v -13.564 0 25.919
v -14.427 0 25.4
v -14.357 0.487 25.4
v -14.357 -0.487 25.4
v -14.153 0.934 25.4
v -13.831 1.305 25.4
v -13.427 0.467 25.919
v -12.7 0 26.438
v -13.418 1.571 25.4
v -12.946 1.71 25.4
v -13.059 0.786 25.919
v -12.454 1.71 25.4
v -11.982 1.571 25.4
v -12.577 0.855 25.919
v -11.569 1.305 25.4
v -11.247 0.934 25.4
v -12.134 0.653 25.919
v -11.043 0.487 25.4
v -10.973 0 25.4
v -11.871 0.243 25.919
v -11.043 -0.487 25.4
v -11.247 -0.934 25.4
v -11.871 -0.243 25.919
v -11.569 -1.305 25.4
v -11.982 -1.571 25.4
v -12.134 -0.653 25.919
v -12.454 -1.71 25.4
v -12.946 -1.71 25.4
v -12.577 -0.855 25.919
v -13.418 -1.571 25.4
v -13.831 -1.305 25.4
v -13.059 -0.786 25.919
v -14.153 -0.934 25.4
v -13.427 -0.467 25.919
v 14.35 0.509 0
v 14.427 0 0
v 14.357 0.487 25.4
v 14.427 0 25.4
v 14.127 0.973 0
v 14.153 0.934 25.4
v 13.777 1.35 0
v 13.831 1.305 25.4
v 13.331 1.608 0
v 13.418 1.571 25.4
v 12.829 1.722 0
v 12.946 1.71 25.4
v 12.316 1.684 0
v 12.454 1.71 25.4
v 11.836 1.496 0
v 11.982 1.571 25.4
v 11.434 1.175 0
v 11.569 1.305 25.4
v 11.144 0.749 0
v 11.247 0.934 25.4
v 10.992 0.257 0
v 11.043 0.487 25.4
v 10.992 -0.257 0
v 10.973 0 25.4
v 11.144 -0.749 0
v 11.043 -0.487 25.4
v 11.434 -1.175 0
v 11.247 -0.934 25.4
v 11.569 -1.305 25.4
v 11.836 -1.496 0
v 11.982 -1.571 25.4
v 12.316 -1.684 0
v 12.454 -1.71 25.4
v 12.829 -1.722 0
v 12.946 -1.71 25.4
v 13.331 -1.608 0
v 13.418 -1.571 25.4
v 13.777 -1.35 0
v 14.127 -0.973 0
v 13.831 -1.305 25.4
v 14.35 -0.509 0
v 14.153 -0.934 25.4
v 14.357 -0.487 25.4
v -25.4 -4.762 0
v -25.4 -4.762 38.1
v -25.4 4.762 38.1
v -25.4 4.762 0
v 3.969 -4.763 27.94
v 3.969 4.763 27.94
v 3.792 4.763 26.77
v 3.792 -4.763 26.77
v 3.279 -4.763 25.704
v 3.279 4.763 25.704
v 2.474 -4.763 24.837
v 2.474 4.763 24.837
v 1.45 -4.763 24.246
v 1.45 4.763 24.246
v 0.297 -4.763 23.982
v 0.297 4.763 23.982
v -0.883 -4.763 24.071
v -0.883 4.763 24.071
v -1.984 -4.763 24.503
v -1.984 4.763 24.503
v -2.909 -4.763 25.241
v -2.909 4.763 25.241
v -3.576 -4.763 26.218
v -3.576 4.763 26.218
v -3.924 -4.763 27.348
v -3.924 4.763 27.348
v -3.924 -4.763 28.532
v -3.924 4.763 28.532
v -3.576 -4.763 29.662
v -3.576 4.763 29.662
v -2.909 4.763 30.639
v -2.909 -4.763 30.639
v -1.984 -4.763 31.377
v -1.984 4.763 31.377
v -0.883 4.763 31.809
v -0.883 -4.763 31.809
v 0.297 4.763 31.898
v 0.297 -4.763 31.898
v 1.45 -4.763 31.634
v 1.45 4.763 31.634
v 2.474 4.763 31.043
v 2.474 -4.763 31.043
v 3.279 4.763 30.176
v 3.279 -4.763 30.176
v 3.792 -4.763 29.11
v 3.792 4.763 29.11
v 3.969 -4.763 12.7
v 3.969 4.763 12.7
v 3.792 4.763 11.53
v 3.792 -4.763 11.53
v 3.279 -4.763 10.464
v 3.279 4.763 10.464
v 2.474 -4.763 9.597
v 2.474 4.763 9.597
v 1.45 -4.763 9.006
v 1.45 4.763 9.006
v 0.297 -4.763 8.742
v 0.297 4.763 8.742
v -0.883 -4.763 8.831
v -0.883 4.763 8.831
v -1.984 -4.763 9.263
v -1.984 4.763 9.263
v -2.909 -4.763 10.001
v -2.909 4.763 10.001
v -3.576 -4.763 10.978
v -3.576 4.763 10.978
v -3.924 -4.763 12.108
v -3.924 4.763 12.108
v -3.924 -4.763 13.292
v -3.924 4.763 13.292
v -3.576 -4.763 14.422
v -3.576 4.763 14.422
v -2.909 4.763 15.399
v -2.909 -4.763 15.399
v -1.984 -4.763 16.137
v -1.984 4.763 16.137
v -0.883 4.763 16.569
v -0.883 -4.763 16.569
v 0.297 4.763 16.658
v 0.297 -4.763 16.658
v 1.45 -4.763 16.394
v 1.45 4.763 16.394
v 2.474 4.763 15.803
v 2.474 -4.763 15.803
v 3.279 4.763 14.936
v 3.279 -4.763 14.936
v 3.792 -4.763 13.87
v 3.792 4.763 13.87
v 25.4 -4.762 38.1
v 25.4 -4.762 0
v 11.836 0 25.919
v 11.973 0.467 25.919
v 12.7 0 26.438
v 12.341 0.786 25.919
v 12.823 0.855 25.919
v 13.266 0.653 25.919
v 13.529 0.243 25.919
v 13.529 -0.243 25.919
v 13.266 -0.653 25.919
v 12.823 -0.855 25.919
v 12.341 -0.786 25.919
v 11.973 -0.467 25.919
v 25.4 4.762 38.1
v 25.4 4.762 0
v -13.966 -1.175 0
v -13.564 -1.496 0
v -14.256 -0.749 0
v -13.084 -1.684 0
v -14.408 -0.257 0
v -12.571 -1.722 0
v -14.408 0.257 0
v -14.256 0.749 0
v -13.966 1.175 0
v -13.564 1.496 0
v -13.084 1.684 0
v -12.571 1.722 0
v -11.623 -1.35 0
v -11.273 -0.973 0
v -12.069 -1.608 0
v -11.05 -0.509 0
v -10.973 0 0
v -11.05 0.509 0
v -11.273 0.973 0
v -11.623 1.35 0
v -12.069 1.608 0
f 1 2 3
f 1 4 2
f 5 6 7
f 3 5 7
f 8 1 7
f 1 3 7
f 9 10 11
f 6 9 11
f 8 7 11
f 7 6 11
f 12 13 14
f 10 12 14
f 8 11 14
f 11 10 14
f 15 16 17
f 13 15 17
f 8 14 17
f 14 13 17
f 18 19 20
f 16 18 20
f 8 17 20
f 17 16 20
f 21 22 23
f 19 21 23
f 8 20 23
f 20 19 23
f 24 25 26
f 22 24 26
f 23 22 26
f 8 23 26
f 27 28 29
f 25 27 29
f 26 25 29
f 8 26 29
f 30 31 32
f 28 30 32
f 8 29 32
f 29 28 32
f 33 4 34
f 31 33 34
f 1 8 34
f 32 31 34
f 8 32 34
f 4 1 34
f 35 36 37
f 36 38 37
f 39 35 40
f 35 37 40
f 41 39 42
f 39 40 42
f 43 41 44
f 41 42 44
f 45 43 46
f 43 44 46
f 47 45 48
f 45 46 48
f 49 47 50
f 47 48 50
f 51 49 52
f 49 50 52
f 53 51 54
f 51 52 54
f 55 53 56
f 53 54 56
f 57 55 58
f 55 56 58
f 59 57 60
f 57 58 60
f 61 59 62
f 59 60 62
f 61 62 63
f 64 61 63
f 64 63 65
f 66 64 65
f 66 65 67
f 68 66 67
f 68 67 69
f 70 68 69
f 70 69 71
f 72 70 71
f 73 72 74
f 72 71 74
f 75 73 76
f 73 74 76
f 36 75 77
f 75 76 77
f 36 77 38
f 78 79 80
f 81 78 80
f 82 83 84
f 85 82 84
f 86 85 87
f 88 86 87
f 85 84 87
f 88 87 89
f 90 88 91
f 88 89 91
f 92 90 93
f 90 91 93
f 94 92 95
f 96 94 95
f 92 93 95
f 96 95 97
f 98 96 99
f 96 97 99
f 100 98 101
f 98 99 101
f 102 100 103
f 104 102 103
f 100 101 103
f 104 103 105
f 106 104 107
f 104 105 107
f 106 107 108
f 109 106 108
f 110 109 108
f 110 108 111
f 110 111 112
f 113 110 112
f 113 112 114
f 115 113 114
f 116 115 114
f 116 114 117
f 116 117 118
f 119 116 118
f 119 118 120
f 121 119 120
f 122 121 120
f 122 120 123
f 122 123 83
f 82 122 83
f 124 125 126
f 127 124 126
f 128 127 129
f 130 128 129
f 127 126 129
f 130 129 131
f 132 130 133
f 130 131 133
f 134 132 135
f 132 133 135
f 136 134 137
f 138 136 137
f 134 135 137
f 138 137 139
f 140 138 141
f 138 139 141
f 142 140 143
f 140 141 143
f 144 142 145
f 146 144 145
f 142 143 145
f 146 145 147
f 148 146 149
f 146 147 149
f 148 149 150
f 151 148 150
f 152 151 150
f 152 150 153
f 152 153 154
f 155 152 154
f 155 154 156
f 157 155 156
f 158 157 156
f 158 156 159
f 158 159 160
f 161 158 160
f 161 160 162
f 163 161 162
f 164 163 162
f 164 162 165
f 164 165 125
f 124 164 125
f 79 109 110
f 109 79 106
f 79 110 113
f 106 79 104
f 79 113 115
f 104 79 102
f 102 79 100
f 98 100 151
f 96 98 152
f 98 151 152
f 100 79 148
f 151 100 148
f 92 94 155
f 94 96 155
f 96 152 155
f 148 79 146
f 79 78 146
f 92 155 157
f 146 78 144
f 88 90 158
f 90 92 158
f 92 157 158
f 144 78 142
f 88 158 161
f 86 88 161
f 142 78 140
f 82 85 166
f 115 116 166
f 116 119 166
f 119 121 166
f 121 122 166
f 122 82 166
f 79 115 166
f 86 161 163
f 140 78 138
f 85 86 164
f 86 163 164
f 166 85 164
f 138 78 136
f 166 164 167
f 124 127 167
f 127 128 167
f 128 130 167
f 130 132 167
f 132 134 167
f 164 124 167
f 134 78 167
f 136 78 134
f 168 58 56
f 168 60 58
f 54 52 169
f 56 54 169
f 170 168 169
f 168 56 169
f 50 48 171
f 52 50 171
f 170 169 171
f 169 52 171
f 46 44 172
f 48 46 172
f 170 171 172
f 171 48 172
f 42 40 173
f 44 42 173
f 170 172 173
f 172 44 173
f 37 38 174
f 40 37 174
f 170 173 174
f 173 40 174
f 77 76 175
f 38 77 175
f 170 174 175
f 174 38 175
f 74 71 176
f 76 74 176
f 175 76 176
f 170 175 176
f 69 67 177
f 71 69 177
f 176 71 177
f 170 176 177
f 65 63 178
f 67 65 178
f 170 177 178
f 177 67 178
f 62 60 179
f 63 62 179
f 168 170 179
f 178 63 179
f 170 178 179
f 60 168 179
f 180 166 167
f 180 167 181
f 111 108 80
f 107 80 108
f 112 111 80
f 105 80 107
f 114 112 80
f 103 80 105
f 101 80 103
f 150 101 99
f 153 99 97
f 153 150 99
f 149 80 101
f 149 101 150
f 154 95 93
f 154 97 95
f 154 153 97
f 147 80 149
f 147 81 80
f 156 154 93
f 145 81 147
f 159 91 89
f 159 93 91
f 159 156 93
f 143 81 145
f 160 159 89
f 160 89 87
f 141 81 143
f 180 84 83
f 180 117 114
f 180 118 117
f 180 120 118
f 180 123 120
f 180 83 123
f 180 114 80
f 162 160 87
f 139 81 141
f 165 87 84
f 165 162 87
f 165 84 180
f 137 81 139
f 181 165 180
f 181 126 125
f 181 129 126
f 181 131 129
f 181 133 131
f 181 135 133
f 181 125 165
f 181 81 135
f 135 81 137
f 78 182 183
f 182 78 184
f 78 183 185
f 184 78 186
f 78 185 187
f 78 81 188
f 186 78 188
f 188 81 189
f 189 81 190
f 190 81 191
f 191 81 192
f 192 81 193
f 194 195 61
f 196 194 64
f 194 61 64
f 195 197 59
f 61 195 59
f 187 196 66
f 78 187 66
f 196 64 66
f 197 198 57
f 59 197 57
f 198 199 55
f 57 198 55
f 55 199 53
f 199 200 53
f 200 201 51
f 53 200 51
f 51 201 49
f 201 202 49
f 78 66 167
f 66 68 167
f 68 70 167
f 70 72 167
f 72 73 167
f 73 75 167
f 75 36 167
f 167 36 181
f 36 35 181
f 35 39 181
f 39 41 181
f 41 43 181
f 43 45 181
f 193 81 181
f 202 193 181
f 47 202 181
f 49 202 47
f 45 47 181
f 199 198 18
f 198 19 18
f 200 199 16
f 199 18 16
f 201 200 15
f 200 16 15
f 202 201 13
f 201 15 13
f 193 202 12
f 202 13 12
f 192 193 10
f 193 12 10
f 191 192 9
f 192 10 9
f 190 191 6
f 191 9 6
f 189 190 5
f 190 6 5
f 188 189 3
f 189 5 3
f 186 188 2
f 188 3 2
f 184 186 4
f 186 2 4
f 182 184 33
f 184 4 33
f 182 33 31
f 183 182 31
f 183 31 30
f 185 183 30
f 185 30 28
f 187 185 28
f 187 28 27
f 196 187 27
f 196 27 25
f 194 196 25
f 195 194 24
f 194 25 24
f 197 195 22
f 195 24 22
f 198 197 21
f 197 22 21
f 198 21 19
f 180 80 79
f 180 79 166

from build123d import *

# Parameters (mm, degrees)
SKETCH1_W                      = 50.8
SKETCH1_H                      = 9.525
BOSS_EXTRUDE1_DEPTH            = 38.1
F_5_16_0_3125_DIAMETER_HOLE1_D = 7.9375
F_8_32_TAPPED_HOLE1_D          = 3.4544
F_8_32_TAPPED_HOLE1_DEPTH      = 25.4
F_8_32_TAPPED_HOLE1_TIP        = 1.037806461


with BuildPart() as part:
    # Sketch1 → Boss-Extrude1 (new body)
    with BuildSketch(Plane.XY):
        Rectangle(SKETCH1_W, SKETCH1_H)
    extrude(amount=BOSS_EXTRUDE1_DEPTH)

    # 5/16 (0.3125) Diameter Hole1 (through all)
    with Locations(Plane(origin=(0, -4.7625, 0), x_dir=(-1, 0, 0), z_dir=(0, -1, 0))):
        with Locations((0, -12.7), (0, -27.94)):
            Hole(F_5_16_0_3125_DIAMETER_HOLE1_D / 2)

    # #8-32 Tapped Hole1
    with Locations(Plane(origin=(0, 0, 0), x_dir=(-1, 0, 0), z_dir=(0, 0, -1))):
        with Locations((-12.7, 0), (12.7, 0)):
            Hole(F_8_32_TAPPED_HOLE1_D / 2, depth=F_8_32_TAPPED_HOLE1_DEPTH)
            with Locations((0, 0, -(F_8_32_TAPPED_HOLE1_DEPTH + F_8_32_TAPPED_HOLE1_TIP / 2))):  # 118° drill point
                Cone(0, F_8_32_TAPPED_HOLE1_D / 2, F_8_32_TAPPED_HOLE1_TIP, mode=Mode.SUBTRACT)


solid = part.part
